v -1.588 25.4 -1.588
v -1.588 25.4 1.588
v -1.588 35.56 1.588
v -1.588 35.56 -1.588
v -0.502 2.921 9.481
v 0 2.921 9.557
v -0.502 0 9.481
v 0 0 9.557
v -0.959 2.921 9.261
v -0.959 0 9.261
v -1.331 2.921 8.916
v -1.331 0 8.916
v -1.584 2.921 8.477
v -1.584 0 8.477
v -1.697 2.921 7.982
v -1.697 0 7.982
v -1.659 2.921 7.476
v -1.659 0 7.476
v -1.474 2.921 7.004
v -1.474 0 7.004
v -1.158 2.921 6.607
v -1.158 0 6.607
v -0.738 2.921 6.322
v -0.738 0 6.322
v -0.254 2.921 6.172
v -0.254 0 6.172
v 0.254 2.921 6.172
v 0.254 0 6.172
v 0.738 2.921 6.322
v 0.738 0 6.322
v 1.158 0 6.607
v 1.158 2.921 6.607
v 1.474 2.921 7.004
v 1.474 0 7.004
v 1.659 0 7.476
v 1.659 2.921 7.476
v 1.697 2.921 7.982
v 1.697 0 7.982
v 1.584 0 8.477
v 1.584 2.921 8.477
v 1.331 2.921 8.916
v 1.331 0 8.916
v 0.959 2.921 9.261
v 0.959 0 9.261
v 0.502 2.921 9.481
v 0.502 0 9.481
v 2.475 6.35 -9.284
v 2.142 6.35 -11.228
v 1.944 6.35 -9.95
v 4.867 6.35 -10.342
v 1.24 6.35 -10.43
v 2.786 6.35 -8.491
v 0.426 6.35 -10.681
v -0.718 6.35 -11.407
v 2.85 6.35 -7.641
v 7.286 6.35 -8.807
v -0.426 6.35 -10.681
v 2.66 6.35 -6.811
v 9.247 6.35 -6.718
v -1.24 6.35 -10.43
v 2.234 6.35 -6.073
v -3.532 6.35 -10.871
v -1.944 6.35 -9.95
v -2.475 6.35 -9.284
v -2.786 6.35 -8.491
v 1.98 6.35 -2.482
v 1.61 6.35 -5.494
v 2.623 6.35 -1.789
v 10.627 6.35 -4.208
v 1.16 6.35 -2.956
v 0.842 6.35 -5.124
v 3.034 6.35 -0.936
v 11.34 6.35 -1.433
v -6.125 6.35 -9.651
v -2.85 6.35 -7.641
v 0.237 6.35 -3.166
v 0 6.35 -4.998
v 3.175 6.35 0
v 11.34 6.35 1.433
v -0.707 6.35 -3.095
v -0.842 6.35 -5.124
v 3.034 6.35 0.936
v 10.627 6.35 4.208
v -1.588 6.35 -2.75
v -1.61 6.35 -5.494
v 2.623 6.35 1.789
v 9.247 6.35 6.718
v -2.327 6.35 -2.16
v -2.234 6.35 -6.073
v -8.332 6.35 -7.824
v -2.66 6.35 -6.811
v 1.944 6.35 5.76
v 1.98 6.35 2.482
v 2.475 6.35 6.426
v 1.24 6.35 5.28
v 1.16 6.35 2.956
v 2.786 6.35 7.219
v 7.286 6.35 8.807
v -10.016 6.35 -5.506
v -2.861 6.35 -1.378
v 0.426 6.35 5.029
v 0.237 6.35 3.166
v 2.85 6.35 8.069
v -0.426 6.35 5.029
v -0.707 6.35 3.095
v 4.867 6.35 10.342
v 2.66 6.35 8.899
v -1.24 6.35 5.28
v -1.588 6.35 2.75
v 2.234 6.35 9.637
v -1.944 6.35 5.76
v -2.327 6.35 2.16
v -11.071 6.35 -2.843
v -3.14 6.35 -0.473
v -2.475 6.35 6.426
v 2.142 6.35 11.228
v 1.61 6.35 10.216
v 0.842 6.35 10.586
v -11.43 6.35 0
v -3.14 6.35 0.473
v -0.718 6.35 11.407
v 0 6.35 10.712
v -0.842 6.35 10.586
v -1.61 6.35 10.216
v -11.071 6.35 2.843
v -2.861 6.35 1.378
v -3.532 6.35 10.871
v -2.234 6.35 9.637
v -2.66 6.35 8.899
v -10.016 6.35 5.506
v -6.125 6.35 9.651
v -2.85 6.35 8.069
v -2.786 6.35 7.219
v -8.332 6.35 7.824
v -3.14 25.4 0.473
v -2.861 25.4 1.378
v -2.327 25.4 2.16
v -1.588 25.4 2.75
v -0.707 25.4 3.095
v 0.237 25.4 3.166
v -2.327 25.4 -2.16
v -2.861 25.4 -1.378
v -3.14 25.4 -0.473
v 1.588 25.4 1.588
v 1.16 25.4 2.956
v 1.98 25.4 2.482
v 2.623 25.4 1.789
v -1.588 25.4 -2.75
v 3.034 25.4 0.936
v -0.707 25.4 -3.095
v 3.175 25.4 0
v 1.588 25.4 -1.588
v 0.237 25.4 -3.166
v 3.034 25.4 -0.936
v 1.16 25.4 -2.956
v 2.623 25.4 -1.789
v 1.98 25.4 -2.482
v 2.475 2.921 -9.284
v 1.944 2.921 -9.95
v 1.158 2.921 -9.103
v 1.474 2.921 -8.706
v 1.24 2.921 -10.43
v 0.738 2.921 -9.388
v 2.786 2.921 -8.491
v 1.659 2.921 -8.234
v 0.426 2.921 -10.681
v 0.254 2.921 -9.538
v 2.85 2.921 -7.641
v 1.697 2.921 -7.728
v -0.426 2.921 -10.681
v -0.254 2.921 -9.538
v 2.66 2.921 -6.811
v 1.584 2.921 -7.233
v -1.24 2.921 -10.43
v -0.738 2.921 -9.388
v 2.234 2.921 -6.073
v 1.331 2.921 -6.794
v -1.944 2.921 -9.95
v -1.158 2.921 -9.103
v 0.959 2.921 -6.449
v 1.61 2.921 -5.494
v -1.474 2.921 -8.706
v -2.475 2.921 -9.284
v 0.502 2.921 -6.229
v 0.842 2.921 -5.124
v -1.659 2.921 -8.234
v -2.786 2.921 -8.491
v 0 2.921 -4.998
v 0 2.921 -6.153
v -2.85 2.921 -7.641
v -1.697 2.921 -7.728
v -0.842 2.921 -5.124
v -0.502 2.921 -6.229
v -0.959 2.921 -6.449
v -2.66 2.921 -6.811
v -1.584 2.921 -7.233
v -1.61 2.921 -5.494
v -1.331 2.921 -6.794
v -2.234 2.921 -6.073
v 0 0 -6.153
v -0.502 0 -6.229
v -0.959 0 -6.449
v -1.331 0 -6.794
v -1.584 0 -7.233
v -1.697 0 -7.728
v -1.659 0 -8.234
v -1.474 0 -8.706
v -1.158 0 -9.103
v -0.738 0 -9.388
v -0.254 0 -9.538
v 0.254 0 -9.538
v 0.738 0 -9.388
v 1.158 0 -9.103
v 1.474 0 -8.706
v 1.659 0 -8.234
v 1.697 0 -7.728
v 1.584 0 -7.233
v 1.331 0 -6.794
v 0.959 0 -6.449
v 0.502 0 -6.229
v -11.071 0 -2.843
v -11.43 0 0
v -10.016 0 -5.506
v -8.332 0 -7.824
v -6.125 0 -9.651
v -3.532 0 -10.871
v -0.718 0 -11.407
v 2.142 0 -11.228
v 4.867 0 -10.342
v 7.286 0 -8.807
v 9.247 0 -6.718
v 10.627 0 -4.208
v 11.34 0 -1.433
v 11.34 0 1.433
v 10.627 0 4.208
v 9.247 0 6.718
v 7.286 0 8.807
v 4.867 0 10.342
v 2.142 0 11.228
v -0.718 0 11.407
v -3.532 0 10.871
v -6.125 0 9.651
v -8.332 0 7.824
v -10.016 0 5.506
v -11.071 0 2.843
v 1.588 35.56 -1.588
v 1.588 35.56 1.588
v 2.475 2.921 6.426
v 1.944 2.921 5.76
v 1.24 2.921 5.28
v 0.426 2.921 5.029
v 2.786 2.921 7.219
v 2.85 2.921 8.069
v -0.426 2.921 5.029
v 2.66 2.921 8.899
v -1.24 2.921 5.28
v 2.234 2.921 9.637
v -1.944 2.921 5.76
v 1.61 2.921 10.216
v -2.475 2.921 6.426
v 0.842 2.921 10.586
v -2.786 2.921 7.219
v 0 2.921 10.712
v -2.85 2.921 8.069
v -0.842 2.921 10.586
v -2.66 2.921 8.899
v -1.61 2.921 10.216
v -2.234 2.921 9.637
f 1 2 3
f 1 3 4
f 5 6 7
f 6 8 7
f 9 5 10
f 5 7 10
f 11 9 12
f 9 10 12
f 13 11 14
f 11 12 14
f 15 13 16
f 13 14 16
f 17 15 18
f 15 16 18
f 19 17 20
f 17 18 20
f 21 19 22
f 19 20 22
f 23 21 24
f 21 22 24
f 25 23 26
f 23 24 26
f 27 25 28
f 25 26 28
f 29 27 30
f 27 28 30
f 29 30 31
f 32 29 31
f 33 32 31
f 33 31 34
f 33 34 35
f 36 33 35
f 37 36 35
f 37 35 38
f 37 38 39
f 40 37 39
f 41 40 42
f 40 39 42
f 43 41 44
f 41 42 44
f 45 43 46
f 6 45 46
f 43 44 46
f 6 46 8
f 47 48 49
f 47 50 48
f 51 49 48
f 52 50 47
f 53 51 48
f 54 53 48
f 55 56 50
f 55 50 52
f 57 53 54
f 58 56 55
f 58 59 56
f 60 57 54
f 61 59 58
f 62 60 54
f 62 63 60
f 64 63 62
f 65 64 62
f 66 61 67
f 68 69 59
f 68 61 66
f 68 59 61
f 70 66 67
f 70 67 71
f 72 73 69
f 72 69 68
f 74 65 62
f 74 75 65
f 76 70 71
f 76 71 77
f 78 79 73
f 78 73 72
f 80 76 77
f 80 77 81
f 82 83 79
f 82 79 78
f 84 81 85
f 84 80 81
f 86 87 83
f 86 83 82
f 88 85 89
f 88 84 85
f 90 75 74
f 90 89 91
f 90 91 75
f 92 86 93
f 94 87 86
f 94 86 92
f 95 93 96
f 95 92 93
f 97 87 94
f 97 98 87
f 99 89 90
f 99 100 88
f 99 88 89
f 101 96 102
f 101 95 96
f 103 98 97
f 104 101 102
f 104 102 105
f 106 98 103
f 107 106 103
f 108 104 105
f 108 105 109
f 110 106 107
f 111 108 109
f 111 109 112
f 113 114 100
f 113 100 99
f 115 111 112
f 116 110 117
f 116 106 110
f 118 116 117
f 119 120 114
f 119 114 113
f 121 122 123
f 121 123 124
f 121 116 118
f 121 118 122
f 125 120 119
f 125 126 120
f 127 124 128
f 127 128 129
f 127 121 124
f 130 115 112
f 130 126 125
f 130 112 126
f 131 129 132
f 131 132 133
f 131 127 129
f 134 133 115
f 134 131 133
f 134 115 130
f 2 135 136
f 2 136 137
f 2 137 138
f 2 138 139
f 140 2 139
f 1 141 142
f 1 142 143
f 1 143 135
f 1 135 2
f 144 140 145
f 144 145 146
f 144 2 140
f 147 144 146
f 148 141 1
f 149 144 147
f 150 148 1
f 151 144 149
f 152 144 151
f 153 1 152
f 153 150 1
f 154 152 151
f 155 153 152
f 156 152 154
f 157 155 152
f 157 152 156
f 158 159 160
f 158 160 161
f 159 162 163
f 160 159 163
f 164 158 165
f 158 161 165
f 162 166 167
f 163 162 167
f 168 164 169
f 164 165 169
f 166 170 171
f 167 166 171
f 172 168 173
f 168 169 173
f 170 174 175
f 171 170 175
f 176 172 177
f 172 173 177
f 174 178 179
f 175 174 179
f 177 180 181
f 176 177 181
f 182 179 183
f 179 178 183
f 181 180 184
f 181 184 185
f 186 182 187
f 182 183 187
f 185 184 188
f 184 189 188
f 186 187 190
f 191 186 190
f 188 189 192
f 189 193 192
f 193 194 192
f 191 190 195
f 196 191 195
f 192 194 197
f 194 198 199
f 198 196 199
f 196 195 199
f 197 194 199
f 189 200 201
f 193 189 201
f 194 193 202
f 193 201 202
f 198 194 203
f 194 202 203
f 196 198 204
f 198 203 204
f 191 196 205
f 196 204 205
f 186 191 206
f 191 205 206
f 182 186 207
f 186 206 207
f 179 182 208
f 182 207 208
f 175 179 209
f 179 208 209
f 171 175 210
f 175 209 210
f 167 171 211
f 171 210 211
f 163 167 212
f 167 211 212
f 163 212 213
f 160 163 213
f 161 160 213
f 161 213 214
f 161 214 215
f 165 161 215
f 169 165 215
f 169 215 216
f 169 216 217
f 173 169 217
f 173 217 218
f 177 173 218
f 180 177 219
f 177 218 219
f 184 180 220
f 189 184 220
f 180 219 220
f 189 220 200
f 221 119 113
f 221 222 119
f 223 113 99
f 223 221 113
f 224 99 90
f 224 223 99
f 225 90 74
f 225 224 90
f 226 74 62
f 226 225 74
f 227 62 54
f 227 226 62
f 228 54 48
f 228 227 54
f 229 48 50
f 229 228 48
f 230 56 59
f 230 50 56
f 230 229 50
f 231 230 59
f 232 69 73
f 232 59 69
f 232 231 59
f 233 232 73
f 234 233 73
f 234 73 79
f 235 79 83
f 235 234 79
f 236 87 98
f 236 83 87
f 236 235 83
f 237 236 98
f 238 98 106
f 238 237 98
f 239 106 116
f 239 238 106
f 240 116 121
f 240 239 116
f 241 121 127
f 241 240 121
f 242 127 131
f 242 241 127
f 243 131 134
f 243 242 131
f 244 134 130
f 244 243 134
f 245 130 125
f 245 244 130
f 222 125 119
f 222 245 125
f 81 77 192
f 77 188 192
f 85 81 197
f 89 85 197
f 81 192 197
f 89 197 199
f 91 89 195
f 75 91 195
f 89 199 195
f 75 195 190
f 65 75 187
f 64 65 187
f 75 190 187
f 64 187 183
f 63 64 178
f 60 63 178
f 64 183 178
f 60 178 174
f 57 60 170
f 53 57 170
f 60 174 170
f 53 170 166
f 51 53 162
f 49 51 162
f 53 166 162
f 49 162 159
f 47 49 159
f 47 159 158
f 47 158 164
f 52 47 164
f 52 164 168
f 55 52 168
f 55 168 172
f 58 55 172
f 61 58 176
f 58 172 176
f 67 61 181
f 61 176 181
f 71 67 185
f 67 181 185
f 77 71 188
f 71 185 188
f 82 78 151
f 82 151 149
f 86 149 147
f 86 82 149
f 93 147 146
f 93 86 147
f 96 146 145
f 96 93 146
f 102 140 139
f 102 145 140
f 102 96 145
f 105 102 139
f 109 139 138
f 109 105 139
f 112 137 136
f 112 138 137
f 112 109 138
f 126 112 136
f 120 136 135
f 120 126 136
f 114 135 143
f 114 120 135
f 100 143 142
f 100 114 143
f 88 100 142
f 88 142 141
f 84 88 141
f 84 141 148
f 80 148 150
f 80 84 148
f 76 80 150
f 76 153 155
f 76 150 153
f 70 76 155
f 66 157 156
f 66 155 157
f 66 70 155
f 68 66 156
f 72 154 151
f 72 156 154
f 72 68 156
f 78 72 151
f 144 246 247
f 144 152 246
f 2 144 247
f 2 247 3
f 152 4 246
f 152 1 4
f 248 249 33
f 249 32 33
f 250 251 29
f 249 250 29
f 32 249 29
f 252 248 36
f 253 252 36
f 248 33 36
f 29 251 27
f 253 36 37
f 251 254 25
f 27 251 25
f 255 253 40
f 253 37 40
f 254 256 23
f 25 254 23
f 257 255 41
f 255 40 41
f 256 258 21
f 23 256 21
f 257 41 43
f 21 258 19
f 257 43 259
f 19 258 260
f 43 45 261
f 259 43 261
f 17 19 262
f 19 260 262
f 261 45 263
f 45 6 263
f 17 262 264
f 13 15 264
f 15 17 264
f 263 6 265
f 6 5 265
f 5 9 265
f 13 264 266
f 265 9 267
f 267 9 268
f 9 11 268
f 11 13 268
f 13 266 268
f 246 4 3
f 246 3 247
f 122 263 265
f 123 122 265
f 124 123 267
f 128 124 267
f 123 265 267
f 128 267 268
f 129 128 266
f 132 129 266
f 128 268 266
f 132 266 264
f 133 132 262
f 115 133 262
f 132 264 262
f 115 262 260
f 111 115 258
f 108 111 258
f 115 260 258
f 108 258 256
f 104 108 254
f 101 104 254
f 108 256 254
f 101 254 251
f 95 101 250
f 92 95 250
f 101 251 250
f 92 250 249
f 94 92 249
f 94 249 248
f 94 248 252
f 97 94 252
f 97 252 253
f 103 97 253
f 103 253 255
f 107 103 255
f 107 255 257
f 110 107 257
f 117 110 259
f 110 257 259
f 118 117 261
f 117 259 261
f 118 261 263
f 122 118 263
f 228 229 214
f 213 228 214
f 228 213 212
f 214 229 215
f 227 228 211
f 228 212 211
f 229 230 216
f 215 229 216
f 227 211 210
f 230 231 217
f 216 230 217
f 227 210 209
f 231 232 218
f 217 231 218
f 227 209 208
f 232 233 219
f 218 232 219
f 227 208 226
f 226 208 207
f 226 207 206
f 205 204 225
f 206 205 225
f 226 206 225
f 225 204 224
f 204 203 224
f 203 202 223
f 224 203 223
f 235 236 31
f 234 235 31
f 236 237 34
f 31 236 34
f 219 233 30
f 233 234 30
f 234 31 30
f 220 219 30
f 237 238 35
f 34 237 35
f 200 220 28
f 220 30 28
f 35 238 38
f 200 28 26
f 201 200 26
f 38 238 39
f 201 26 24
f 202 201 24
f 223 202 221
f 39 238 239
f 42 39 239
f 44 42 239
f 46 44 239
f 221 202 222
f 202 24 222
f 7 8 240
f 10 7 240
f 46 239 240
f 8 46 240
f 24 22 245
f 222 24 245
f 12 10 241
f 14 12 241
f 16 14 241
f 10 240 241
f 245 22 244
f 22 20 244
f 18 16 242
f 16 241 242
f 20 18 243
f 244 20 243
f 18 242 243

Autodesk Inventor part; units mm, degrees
ref_plane "YZ Plane" through (0, 0, 0) normal (1, 0, 0) x (0, 1, 0)
ref_plane "XZ Plane" through (0, 0, 0) normal (0, 1, 0) x (-1, 0, 0)
ref_plane "XY Plane" through (0, 0, 0) normal (0, 0, 1) x (1, 0, 0)
sketch "Sketch1" plane through (0, 0, 0) normal (0, 1, 0) x (-1, 0, 0)
  circle A0 centre (0, 0) radius 11.43
  dimension "d0" = 22.86
extrude "Extrusion1" add sketch "Sketch1" along normal blind 6.35
sketch "Sketch2" plane through (0, 6.35, 0) normal (0, 1, 0) x (1, 0, 0)
  point P0 (0, 0)
  point P1 (0, 7.855)
  point P2 (0, -7.855)
  dimension "d3" = 15.7099
  dimension "d4" = 7.8549
  dimension "d21" = 7.8549
  dimension "d22" = 0
hole "Hole1" at (0, 6.35, -7.855) at (0, 6.35, 7.855) direction (0, -1, 0) diameter 3.4036 end through all counterbore diameter 5.715 counterbore depth 3.429
sketch "Sketch3" plane through (0, 6.35, 0) normal (0, 1, 0) x (1, 0, 0)
  circle A0 centre (0, 0) radius 3.175
  dimension "d12" = 6.35
extrude "Extrusion2" add sketch "Sketch3" along normal blind 19.05
sketch "Sketch4" plane through (0, 25.4, 0) normal (0, 1, 0) x (1, 0, 0)
  line L0 (1.5875, -1.5875) -> (-1.5875, -1.5875)
  line L1 (-1.5875, -1.5875) -> (-1.5875, 1.5875)
  line L2 (-1.5875, 1.5875) -> (1.5875, 1.5875)
  line L3 (1.5875, 1.5875) -> (1.5875, -1.5875)
  point P0 (0, 0)
  dimension "d15" = 3.175
  dimension "d16" = 3.175
  dimension "d17" = 1.5875
  dimension "d18" = 1.5875
extrude "Extrusion3" add sketch "Sketch4" along normal blind 10.16
equation "\"d4\" = 0.5 * d3"
equation "\"d21\" = 0.5 * d3"
equation "\"d17\" = 0.5 * d15"
equation "\"d18\" = 0.5 * d16"
properties part number "vex motor adaptor to tetrix"
